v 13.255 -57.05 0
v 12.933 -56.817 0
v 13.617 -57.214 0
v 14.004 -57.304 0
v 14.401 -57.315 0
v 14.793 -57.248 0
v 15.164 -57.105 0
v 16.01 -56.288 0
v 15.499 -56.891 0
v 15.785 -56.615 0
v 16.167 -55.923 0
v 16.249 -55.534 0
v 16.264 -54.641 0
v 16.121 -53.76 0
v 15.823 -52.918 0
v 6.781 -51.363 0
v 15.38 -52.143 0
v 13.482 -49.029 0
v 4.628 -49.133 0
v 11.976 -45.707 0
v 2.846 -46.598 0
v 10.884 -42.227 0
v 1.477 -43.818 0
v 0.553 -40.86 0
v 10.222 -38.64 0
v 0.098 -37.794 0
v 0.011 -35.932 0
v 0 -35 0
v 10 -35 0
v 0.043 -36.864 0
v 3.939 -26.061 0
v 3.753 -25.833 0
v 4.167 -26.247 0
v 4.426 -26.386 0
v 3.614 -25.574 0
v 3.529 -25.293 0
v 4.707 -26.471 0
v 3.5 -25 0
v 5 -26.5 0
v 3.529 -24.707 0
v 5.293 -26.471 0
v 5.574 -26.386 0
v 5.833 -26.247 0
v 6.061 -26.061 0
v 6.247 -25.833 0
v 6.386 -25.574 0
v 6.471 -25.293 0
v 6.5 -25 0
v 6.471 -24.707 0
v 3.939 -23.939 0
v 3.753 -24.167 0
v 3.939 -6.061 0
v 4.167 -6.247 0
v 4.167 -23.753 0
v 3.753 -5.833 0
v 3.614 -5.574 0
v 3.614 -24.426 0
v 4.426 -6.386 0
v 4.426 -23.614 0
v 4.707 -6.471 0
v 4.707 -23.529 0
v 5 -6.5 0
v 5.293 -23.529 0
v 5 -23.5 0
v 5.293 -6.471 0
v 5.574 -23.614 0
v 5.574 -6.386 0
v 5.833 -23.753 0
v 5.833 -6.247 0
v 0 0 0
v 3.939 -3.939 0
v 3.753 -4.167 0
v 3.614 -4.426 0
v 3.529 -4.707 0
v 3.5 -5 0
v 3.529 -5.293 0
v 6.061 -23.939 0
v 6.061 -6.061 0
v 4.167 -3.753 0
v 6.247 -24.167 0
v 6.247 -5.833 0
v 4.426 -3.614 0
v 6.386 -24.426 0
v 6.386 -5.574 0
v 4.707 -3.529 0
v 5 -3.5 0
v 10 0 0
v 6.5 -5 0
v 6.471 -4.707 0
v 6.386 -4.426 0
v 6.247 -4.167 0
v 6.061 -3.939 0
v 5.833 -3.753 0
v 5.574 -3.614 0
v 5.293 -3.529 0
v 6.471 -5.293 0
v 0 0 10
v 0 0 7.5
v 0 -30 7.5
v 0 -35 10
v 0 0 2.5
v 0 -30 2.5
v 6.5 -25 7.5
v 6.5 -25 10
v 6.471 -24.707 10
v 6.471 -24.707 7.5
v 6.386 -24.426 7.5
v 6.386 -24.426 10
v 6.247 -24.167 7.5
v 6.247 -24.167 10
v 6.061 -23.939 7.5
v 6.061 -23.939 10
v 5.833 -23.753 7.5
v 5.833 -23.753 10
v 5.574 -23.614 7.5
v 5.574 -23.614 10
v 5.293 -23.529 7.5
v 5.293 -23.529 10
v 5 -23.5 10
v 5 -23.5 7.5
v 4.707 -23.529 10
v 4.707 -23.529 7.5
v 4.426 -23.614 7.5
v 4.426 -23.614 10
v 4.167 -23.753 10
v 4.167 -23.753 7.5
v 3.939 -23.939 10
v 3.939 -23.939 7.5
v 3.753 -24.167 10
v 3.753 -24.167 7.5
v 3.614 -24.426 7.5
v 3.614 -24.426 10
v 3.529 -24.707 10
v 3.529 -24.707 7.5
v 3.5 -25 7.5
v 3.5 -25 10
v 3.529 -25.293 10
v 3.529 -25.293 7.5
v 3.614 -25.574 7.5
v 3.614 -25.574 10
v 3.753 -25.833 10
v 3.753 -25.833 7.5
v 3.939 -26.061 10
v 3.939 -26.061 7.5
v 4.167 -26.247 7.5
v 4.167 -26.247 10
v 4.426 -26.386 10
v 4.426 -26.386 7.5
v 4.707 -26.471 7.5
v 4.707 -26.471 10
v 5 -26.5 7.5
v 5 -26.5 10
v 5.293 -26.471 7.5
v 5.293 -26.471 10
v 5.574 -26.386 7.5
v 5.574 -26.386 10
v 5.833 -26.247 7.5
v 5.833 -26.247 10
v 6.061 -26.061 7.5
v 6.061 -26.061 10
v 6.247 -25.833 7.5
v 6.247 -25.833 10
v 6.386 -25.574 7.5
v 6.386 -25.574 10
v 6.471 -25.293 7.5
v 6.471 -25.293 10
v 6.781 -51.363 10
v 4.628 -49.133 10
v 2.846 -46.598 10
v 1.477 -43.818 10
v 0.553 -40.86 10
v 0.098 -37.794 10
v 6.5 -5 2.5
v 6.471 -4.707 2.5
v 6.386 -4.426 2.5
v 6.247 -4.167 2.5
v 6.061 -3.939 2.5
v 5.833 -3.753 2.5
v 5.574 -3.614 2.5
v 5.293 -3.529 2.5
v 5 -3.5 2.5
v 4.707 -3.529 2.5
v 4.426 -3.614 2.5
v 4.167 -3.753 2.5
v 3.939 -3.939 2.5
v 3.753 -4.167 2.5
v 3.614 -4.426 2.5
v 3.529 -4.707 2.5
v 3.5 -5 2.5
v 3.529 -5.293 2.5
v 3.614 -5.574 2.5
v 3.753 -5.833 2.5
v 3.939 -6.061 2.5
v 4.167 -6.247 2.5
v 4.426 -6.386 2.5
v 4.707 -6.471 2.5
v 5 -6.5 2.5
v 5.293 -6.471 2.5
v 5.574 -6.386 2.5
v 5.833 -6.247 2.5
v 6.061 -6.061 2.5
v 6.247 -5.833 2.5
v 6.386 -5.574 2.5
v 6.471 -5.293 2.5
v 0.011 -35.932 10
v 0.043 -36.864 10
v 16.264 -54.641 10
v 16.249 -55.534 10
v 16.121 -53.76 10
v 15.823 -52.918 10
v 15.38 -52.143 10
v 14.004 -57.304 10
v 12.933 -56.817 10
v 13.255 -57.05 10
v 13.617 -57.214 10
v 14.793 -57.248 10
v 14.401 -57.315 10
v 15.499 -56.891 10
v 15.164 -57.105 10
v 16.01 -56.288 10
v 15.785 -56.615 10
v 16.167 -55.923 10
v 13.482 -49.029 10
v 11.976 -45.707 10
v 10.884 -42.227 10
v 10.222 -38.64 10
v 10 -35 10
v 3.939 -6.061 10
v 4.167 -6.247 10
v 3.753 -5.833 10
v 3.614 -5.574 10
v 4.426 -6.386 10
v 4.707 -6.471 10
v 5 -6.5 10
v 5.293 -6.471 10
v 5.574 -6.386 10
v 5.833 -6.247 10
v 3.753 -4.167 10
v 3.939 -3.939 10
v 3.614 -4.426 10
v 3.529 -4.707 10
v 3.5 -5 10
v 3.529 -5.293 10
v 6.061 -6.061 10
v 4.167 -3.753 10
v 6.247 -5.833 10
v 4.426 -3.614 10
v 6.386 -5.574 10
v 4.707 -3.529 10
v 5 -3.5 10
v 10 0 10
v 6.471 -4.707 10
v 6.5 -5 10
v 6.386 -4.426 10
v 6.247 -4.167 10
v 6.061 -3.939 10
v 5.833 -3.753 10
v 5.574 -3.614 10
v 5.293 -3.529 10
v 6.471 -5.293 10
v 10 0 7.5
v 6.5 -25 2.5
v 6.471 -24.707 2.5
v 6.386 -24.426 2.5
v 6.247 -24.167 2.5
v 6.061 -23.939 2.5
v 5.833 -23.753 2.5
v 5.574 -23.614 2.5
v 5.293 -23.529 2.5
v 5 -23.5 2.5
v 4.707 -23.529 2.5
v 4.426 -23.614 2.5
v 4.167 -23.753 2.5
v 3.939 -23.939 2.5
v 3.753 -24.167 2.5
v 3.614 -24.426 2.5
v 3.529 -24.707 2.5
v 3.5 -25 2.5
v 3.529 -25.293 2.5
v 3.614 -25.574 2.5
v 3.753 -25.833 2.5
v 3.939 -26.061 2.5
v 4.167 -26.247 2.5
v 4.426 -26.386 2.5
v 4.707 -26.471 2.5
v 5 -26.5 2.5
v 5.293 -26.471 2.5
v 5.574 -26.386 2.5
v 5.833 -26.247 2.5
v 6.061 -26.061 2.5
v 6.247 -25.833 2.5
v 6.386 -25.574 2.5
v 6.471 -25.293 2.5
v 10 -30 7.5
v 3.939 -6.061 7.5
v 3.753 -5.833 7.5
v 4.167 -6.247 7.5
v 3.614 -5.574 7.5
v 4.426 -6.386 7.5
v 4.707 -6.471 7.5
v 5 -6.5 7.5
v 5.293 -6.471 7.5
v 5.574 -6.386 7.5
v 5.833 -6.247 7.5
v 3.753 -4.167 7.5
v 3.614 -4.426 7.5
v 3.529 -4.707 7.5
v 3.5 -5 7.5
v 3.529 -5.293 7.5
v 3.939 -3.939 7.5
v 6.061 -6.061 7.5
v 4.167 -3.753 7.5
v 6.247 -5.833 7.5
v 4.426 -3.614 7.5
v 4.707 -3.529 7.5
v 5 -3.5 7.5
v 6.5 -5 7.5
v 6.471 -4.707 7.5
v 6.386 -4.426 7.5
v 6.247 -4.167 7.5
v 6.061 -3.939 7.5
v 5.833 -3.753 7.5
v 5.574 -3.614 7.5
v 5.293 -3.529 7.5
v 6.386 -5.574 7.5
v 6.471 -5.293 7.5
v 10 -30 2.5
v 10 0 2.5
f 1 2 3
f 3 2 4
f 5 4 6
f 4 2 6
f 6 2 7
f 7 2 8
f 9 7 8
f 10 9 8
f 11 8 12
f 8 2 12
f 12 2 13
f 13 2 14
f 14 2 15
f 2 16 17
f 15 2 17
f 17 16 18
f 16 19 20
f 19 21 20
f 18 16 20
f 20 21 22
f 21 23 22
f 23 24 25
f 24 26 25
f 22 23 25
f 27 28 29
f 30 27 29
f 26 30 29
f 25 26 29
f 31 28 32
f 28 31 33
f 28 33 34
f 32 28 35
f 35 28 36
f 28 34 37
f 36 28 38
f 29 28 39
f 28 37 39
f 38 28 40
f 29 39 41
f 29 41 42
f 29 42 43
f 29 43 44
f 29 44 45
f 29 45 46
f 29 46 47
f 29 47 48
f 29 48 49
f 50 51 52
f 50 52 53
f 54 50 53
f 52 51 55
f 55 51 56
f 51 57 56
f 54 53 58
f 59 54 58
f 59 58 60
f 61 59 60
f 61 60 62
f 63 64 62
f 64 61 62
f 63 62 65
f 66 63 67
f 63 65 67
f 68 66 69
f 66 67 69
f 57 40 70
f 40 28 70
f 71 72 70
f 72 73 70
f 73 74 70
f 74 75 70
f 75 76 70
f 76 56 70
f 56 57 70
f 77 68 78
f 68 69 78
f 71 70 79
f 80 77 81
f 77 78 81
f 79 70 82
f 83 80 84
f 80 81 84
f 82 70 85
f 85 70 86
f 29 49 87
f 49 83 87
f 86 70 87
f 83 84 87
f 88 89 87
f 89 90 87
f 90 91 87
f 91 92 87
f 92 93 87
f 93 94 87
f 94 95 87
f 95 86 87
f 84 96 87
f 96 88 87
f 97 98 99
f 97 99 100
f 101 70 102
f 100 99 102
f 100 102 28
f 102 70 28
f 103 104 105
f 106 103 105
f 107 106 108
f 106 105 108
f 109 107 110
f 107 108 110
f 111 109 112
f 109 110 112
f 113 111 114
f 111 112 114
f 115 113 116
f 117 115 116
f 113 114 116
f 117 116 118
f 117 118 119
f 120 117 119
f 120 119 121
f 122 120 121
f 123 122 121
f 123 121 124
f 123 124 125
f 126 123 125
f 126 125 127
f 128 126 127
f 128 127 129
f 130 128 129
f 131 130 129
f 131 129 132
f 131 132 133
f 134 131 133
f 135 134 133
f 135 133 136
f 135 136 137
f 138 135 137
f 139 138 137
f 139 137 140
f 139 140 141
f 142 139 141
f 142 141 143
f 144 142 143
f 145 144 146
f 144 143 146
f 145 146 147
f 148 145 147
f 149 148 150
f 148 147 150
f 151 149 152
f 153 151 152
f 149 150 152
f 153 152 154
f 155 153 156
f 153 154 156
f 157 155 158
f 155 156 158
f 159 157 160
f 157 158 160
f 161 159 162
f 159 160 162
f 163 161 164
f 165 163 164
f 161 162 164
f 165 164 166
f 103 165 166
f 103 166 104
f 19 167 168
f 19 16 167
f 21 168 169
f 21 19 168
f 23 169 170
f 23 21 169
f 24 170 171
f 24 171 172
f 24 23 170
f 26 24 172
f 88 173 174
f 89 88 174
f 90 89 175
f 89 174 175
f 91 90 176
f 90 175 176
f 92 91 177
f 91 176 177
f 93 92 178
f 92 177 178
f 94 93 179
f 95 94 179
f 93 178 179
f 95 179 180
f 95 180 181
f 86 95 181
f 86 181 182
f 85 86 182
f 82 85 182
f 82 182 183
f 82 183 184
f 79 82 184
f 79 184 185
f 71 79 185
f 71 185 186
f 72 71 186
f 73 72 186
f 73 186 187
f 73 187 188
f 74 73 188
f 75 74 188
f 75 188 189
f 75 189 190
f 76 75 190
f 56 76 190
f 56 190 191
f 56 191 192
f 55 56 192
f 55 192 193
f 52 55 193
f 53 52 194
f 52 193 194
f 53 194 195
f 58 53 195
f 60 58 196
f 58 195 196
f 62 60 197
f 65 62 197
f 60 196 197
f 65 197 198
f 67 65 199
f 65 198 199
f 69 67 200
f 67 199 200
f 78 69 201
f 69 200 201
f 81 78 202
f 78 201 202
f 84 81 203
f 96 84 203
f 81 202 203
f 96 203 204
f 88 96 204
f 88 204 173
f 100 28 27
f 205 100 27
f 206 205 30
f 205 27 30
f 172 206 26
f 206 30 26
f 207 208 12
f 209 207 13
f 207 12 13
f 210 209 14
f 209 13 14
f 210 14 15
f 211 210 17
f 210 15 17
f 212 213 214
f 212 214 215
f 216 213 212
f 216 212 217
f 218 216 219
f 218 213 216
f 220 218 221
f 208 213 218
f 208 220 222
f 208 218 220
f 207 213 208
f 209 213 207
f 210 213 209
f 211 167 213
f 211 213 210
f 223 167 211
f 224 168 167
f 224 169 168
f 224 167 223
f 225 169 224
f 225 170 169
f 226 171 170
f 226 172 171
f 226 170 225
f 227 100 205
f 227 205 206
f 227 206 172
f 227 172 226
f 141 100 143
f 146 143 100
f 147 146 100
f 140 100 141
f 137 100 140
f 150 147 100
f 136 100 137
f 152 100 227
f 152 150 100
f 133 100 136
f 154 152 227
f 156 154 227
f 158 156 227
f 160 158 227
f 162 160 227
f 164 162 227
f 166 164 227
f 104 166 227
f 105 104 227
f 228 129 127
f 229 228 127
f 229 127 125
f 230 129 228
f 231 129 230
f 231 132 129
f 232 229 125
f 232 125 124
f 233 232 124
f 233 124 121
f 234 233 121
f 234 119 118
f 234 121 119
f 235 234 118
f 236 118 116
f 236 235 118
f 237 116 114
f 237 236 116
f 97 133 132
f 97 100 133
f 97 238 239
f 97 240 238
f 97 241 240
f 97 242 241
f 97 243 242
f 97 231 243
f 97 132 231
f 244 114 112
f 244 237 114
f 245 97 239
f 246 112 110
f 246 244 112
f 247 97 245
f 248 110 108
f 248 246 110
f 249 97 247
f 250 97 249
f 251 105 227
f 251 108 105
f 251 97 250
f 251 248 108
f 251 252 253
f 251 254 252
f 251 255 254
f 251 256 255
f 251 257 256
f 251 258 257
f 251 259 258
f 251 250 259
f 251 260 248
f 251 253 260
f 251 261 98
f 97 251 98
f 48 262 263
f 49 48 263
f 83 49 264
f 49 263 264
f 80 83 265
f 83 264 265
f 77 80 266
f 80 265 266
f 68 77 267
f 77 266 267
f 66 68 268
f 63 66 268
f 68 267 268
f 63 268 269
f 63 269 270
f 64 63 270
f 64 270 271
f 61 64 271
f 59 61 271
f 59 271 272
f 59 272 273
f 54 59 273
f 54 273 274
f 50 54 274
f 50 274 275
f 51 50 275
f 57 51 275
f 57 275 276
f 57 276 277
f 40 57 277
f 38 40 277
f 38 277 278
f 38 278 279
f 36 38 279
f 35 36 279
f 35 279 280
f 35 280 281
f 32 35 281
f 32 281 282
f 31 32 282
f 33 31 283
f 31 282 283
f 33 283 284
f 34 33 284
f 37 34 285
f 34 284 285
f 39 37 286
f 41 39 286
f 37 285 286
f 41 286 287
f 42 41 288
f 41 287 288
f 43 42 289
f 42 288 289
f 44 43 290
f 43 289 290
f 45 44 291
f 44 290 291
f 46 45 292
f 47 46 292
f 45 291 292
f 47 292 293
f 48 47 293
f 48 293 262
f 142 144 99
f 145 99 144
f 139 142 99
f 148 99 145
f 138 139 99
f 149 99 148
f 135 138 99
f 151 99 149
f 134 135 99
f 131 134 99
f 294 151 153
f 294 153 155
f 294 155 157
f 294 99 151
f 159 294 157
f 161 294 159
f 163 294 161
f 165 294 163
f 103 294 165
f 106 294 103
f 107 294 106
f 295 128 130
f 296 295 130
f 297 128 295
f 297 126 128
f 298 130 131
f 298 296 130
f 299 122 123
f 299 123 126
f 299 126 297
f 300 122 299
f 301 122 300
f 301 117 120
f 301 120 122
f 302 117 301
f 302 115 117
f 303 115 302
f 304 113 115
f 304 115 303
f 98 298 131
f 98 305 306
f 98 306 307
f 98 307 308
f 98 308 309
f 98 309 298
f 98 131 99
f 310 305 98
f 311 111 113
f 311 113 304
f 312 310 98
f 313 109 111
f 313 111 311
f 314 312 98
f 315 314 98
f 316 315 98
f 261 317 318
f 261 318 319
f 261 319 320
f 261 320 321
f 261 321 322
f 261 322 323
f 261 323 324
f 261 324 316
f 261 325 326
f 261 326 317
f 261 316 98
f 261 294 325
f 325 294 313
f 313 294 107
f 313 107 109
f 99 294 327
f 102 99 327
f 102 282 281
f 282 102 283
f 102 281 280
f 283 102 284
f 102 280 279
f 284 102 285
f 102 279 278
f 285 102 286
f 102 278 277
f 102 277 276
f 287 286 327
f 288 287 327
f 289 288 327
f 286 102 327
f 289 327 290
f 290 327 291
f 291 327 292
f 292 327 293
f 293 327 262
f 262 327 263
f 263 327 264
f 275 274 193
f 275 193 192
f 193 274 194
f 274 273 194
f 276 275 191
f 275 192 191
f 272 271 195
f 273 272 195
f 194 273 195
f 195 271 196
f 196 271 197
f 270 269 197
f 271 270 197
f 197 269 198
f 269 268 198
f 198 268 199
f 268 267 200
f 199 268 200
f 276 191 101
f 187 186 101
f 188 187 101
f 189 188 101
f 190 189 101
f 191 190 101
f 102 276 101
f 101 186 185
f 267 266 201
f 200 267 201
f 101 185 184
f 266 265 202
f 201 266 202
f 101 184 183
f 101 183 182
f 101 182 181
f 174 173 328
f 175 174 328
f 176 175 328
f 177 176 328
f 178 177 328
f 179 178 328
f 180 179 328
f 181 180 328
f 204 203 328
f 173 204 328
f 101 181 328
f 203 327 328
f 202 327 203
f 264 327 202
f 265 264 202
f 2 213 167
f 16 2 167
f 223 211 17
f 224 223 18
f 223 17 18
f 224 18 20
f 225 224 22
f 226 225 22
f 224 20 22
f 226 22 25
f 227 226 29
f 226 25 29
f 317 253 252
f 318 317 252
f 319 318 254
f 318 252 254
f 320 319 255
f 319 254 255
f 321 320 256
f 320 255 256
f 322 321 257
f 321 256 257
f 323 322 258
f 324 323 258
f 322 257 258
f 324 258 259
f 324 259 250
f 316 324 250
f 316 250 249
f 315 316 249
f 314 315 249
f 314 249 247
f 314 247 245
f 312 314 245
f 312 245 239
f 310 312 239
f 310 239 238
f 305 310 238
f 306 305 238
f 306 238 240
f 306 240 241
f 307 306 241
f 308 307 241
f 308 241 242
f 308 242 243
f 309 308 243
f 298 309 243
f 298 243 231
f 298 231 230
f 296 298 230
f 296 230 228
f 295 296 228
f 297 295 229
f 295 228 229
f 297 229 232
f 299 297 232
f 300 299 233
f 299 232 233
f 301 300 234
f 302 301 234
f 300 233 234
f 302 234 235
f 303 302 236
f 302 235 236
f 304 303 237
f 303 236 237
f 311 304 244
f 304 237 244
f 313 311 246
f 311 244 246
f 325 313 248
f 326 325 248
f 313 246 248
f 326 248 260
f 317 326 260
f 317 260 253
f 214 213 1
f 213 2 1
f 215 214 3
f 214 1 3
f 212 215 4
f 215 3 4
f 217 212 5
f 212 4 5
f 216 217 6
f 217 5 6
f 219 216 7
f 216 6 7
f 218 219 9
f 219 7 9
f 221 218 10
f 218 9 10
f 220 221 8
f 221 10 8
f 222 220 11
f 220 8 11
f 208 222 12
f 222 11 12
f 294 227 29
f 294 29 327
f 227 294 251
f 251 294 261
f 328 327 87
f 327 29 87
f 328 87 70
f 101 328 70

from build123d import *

# Parameters (mm, degrees)
BOSS_EXTRU_1_DEPTH      = 10
ESQUISSE2_W             = 5
ESQUISSE2_H             = 30
ENL_V_MAT_EXTRU_1_DEPTH = 62.64414003
ESQUISSE3_R             = 1.5
ENL_V_MAT_EXTRU_2_DEPTH = 63.967823601
ESQUISSE5_R             = 1.5
ENL_V_MAT_EXTRU_3_DEPTH = 63.967823601
ENL_V_MAT_EXTRU_4_DEPTH = 63.967823601
CONG_VARIABLE1_R        = 2
CONG_4_R                = 20


with BuildPart() as part:
    # Esquisse1 → Boss.-Extru.1 (new body)
    with BuildSketch(Plane.XY):
        with BuildLine():
            ThreePointArc((0, -35), (1.835599765, -46.978253407), (7.173927734, -57.857142857))
            ThreePointArc((7.173927734, -57.857142857), (14.134329624, -59.103259033), (15.380445801, -52.142857143))
            ThreePointArc((15.380445801, -52.142857143), (11.376699824, -43.983690055), (10, -35))
            Line((10, -35), (10, 0))
            Line((10, 0), (0, 0))
            Line((0, 0), (0, -35))
        make_face()
    extrude(amount=BOSS_EXTRU_1_DEPTH)

    # Esquisse2 → Enl_v. mat.-Extru.1 (cut, through all)
    with BuildSketch(Plane(origin=(10, 0, 0), x_dir=(0, 0, -1), z_dir=(1, 0, 0))):
        with Locations((-5, -15)):
            Rectangle(ESQUISSE2_W, ESQUISSE2_H)
    extrude(amount=-ENL_V_MAT_EXTRU_1_DEPTH, mode=Mode.SUBTRACT)

    # Esquisse3 → Enl_v. mat.-Extru.2 (cut, through all)
    with BuildSketch(Plane.XY.offset(10)):
        with Locations((5, -5)):
            Circle(ESQUISSE3_R)
    extrude(amount=-ENL_V_MAT_EXTRU_2_DEPTH, mode=Mode.SUBTRACT)

    # Esquisse5 → Enl_v. mat.-Extru.3 (cut, through all)
    with BuildSketch(Plane.XY.offset(10)):
        with Locations((5, -25)):
            Circle(ESQUISSE5_R)
    extrude(amount=-ENL_V_MAT_EXTRU_3_DEPTH, mode=Mode.SUBTRACT)

    # Esquisse6 → Enl_v. mat.-Extru.4 (cut, through all)
    with BuildSketch(Plane.XY.offset(10)):
        with BuildLine():
            Line((14.840420876, -58.507614957), (1.835599765, -46.978253407))
            ThreePointArc((1.835599765, -46.978253407), (4.090400233, -52.621028477), (7.173927734, -57.857142857))
            ThreePointArc((7.173927734, -57.857142857), (10.854475024, -59.982099435), (14.840420876, -58.507614957))
        make_face()
    extrude(amount=-ENL_V_MAT_EXTRU_4_DEPTH, mode=Mode.SUBTRACT)

    # Cong_ variable1
    cong_variable1_edges = [part.edges().sort_by_distance(p)[0] for p in [
        (14.840420876, -58.507614957, 5),
    ]]
    fillet(cong_variable1_edges, radius=CONG_VARIABLE1_R)

    # Cong_4
    cong_4_edges = [part.edges().sort_by_distance(p)[0] for p in [
        (1.835599765, -46.978253407, 5),
    ]]
    fillet(cong_4_edges, radius=CONG_4_R)


solid = part.part
